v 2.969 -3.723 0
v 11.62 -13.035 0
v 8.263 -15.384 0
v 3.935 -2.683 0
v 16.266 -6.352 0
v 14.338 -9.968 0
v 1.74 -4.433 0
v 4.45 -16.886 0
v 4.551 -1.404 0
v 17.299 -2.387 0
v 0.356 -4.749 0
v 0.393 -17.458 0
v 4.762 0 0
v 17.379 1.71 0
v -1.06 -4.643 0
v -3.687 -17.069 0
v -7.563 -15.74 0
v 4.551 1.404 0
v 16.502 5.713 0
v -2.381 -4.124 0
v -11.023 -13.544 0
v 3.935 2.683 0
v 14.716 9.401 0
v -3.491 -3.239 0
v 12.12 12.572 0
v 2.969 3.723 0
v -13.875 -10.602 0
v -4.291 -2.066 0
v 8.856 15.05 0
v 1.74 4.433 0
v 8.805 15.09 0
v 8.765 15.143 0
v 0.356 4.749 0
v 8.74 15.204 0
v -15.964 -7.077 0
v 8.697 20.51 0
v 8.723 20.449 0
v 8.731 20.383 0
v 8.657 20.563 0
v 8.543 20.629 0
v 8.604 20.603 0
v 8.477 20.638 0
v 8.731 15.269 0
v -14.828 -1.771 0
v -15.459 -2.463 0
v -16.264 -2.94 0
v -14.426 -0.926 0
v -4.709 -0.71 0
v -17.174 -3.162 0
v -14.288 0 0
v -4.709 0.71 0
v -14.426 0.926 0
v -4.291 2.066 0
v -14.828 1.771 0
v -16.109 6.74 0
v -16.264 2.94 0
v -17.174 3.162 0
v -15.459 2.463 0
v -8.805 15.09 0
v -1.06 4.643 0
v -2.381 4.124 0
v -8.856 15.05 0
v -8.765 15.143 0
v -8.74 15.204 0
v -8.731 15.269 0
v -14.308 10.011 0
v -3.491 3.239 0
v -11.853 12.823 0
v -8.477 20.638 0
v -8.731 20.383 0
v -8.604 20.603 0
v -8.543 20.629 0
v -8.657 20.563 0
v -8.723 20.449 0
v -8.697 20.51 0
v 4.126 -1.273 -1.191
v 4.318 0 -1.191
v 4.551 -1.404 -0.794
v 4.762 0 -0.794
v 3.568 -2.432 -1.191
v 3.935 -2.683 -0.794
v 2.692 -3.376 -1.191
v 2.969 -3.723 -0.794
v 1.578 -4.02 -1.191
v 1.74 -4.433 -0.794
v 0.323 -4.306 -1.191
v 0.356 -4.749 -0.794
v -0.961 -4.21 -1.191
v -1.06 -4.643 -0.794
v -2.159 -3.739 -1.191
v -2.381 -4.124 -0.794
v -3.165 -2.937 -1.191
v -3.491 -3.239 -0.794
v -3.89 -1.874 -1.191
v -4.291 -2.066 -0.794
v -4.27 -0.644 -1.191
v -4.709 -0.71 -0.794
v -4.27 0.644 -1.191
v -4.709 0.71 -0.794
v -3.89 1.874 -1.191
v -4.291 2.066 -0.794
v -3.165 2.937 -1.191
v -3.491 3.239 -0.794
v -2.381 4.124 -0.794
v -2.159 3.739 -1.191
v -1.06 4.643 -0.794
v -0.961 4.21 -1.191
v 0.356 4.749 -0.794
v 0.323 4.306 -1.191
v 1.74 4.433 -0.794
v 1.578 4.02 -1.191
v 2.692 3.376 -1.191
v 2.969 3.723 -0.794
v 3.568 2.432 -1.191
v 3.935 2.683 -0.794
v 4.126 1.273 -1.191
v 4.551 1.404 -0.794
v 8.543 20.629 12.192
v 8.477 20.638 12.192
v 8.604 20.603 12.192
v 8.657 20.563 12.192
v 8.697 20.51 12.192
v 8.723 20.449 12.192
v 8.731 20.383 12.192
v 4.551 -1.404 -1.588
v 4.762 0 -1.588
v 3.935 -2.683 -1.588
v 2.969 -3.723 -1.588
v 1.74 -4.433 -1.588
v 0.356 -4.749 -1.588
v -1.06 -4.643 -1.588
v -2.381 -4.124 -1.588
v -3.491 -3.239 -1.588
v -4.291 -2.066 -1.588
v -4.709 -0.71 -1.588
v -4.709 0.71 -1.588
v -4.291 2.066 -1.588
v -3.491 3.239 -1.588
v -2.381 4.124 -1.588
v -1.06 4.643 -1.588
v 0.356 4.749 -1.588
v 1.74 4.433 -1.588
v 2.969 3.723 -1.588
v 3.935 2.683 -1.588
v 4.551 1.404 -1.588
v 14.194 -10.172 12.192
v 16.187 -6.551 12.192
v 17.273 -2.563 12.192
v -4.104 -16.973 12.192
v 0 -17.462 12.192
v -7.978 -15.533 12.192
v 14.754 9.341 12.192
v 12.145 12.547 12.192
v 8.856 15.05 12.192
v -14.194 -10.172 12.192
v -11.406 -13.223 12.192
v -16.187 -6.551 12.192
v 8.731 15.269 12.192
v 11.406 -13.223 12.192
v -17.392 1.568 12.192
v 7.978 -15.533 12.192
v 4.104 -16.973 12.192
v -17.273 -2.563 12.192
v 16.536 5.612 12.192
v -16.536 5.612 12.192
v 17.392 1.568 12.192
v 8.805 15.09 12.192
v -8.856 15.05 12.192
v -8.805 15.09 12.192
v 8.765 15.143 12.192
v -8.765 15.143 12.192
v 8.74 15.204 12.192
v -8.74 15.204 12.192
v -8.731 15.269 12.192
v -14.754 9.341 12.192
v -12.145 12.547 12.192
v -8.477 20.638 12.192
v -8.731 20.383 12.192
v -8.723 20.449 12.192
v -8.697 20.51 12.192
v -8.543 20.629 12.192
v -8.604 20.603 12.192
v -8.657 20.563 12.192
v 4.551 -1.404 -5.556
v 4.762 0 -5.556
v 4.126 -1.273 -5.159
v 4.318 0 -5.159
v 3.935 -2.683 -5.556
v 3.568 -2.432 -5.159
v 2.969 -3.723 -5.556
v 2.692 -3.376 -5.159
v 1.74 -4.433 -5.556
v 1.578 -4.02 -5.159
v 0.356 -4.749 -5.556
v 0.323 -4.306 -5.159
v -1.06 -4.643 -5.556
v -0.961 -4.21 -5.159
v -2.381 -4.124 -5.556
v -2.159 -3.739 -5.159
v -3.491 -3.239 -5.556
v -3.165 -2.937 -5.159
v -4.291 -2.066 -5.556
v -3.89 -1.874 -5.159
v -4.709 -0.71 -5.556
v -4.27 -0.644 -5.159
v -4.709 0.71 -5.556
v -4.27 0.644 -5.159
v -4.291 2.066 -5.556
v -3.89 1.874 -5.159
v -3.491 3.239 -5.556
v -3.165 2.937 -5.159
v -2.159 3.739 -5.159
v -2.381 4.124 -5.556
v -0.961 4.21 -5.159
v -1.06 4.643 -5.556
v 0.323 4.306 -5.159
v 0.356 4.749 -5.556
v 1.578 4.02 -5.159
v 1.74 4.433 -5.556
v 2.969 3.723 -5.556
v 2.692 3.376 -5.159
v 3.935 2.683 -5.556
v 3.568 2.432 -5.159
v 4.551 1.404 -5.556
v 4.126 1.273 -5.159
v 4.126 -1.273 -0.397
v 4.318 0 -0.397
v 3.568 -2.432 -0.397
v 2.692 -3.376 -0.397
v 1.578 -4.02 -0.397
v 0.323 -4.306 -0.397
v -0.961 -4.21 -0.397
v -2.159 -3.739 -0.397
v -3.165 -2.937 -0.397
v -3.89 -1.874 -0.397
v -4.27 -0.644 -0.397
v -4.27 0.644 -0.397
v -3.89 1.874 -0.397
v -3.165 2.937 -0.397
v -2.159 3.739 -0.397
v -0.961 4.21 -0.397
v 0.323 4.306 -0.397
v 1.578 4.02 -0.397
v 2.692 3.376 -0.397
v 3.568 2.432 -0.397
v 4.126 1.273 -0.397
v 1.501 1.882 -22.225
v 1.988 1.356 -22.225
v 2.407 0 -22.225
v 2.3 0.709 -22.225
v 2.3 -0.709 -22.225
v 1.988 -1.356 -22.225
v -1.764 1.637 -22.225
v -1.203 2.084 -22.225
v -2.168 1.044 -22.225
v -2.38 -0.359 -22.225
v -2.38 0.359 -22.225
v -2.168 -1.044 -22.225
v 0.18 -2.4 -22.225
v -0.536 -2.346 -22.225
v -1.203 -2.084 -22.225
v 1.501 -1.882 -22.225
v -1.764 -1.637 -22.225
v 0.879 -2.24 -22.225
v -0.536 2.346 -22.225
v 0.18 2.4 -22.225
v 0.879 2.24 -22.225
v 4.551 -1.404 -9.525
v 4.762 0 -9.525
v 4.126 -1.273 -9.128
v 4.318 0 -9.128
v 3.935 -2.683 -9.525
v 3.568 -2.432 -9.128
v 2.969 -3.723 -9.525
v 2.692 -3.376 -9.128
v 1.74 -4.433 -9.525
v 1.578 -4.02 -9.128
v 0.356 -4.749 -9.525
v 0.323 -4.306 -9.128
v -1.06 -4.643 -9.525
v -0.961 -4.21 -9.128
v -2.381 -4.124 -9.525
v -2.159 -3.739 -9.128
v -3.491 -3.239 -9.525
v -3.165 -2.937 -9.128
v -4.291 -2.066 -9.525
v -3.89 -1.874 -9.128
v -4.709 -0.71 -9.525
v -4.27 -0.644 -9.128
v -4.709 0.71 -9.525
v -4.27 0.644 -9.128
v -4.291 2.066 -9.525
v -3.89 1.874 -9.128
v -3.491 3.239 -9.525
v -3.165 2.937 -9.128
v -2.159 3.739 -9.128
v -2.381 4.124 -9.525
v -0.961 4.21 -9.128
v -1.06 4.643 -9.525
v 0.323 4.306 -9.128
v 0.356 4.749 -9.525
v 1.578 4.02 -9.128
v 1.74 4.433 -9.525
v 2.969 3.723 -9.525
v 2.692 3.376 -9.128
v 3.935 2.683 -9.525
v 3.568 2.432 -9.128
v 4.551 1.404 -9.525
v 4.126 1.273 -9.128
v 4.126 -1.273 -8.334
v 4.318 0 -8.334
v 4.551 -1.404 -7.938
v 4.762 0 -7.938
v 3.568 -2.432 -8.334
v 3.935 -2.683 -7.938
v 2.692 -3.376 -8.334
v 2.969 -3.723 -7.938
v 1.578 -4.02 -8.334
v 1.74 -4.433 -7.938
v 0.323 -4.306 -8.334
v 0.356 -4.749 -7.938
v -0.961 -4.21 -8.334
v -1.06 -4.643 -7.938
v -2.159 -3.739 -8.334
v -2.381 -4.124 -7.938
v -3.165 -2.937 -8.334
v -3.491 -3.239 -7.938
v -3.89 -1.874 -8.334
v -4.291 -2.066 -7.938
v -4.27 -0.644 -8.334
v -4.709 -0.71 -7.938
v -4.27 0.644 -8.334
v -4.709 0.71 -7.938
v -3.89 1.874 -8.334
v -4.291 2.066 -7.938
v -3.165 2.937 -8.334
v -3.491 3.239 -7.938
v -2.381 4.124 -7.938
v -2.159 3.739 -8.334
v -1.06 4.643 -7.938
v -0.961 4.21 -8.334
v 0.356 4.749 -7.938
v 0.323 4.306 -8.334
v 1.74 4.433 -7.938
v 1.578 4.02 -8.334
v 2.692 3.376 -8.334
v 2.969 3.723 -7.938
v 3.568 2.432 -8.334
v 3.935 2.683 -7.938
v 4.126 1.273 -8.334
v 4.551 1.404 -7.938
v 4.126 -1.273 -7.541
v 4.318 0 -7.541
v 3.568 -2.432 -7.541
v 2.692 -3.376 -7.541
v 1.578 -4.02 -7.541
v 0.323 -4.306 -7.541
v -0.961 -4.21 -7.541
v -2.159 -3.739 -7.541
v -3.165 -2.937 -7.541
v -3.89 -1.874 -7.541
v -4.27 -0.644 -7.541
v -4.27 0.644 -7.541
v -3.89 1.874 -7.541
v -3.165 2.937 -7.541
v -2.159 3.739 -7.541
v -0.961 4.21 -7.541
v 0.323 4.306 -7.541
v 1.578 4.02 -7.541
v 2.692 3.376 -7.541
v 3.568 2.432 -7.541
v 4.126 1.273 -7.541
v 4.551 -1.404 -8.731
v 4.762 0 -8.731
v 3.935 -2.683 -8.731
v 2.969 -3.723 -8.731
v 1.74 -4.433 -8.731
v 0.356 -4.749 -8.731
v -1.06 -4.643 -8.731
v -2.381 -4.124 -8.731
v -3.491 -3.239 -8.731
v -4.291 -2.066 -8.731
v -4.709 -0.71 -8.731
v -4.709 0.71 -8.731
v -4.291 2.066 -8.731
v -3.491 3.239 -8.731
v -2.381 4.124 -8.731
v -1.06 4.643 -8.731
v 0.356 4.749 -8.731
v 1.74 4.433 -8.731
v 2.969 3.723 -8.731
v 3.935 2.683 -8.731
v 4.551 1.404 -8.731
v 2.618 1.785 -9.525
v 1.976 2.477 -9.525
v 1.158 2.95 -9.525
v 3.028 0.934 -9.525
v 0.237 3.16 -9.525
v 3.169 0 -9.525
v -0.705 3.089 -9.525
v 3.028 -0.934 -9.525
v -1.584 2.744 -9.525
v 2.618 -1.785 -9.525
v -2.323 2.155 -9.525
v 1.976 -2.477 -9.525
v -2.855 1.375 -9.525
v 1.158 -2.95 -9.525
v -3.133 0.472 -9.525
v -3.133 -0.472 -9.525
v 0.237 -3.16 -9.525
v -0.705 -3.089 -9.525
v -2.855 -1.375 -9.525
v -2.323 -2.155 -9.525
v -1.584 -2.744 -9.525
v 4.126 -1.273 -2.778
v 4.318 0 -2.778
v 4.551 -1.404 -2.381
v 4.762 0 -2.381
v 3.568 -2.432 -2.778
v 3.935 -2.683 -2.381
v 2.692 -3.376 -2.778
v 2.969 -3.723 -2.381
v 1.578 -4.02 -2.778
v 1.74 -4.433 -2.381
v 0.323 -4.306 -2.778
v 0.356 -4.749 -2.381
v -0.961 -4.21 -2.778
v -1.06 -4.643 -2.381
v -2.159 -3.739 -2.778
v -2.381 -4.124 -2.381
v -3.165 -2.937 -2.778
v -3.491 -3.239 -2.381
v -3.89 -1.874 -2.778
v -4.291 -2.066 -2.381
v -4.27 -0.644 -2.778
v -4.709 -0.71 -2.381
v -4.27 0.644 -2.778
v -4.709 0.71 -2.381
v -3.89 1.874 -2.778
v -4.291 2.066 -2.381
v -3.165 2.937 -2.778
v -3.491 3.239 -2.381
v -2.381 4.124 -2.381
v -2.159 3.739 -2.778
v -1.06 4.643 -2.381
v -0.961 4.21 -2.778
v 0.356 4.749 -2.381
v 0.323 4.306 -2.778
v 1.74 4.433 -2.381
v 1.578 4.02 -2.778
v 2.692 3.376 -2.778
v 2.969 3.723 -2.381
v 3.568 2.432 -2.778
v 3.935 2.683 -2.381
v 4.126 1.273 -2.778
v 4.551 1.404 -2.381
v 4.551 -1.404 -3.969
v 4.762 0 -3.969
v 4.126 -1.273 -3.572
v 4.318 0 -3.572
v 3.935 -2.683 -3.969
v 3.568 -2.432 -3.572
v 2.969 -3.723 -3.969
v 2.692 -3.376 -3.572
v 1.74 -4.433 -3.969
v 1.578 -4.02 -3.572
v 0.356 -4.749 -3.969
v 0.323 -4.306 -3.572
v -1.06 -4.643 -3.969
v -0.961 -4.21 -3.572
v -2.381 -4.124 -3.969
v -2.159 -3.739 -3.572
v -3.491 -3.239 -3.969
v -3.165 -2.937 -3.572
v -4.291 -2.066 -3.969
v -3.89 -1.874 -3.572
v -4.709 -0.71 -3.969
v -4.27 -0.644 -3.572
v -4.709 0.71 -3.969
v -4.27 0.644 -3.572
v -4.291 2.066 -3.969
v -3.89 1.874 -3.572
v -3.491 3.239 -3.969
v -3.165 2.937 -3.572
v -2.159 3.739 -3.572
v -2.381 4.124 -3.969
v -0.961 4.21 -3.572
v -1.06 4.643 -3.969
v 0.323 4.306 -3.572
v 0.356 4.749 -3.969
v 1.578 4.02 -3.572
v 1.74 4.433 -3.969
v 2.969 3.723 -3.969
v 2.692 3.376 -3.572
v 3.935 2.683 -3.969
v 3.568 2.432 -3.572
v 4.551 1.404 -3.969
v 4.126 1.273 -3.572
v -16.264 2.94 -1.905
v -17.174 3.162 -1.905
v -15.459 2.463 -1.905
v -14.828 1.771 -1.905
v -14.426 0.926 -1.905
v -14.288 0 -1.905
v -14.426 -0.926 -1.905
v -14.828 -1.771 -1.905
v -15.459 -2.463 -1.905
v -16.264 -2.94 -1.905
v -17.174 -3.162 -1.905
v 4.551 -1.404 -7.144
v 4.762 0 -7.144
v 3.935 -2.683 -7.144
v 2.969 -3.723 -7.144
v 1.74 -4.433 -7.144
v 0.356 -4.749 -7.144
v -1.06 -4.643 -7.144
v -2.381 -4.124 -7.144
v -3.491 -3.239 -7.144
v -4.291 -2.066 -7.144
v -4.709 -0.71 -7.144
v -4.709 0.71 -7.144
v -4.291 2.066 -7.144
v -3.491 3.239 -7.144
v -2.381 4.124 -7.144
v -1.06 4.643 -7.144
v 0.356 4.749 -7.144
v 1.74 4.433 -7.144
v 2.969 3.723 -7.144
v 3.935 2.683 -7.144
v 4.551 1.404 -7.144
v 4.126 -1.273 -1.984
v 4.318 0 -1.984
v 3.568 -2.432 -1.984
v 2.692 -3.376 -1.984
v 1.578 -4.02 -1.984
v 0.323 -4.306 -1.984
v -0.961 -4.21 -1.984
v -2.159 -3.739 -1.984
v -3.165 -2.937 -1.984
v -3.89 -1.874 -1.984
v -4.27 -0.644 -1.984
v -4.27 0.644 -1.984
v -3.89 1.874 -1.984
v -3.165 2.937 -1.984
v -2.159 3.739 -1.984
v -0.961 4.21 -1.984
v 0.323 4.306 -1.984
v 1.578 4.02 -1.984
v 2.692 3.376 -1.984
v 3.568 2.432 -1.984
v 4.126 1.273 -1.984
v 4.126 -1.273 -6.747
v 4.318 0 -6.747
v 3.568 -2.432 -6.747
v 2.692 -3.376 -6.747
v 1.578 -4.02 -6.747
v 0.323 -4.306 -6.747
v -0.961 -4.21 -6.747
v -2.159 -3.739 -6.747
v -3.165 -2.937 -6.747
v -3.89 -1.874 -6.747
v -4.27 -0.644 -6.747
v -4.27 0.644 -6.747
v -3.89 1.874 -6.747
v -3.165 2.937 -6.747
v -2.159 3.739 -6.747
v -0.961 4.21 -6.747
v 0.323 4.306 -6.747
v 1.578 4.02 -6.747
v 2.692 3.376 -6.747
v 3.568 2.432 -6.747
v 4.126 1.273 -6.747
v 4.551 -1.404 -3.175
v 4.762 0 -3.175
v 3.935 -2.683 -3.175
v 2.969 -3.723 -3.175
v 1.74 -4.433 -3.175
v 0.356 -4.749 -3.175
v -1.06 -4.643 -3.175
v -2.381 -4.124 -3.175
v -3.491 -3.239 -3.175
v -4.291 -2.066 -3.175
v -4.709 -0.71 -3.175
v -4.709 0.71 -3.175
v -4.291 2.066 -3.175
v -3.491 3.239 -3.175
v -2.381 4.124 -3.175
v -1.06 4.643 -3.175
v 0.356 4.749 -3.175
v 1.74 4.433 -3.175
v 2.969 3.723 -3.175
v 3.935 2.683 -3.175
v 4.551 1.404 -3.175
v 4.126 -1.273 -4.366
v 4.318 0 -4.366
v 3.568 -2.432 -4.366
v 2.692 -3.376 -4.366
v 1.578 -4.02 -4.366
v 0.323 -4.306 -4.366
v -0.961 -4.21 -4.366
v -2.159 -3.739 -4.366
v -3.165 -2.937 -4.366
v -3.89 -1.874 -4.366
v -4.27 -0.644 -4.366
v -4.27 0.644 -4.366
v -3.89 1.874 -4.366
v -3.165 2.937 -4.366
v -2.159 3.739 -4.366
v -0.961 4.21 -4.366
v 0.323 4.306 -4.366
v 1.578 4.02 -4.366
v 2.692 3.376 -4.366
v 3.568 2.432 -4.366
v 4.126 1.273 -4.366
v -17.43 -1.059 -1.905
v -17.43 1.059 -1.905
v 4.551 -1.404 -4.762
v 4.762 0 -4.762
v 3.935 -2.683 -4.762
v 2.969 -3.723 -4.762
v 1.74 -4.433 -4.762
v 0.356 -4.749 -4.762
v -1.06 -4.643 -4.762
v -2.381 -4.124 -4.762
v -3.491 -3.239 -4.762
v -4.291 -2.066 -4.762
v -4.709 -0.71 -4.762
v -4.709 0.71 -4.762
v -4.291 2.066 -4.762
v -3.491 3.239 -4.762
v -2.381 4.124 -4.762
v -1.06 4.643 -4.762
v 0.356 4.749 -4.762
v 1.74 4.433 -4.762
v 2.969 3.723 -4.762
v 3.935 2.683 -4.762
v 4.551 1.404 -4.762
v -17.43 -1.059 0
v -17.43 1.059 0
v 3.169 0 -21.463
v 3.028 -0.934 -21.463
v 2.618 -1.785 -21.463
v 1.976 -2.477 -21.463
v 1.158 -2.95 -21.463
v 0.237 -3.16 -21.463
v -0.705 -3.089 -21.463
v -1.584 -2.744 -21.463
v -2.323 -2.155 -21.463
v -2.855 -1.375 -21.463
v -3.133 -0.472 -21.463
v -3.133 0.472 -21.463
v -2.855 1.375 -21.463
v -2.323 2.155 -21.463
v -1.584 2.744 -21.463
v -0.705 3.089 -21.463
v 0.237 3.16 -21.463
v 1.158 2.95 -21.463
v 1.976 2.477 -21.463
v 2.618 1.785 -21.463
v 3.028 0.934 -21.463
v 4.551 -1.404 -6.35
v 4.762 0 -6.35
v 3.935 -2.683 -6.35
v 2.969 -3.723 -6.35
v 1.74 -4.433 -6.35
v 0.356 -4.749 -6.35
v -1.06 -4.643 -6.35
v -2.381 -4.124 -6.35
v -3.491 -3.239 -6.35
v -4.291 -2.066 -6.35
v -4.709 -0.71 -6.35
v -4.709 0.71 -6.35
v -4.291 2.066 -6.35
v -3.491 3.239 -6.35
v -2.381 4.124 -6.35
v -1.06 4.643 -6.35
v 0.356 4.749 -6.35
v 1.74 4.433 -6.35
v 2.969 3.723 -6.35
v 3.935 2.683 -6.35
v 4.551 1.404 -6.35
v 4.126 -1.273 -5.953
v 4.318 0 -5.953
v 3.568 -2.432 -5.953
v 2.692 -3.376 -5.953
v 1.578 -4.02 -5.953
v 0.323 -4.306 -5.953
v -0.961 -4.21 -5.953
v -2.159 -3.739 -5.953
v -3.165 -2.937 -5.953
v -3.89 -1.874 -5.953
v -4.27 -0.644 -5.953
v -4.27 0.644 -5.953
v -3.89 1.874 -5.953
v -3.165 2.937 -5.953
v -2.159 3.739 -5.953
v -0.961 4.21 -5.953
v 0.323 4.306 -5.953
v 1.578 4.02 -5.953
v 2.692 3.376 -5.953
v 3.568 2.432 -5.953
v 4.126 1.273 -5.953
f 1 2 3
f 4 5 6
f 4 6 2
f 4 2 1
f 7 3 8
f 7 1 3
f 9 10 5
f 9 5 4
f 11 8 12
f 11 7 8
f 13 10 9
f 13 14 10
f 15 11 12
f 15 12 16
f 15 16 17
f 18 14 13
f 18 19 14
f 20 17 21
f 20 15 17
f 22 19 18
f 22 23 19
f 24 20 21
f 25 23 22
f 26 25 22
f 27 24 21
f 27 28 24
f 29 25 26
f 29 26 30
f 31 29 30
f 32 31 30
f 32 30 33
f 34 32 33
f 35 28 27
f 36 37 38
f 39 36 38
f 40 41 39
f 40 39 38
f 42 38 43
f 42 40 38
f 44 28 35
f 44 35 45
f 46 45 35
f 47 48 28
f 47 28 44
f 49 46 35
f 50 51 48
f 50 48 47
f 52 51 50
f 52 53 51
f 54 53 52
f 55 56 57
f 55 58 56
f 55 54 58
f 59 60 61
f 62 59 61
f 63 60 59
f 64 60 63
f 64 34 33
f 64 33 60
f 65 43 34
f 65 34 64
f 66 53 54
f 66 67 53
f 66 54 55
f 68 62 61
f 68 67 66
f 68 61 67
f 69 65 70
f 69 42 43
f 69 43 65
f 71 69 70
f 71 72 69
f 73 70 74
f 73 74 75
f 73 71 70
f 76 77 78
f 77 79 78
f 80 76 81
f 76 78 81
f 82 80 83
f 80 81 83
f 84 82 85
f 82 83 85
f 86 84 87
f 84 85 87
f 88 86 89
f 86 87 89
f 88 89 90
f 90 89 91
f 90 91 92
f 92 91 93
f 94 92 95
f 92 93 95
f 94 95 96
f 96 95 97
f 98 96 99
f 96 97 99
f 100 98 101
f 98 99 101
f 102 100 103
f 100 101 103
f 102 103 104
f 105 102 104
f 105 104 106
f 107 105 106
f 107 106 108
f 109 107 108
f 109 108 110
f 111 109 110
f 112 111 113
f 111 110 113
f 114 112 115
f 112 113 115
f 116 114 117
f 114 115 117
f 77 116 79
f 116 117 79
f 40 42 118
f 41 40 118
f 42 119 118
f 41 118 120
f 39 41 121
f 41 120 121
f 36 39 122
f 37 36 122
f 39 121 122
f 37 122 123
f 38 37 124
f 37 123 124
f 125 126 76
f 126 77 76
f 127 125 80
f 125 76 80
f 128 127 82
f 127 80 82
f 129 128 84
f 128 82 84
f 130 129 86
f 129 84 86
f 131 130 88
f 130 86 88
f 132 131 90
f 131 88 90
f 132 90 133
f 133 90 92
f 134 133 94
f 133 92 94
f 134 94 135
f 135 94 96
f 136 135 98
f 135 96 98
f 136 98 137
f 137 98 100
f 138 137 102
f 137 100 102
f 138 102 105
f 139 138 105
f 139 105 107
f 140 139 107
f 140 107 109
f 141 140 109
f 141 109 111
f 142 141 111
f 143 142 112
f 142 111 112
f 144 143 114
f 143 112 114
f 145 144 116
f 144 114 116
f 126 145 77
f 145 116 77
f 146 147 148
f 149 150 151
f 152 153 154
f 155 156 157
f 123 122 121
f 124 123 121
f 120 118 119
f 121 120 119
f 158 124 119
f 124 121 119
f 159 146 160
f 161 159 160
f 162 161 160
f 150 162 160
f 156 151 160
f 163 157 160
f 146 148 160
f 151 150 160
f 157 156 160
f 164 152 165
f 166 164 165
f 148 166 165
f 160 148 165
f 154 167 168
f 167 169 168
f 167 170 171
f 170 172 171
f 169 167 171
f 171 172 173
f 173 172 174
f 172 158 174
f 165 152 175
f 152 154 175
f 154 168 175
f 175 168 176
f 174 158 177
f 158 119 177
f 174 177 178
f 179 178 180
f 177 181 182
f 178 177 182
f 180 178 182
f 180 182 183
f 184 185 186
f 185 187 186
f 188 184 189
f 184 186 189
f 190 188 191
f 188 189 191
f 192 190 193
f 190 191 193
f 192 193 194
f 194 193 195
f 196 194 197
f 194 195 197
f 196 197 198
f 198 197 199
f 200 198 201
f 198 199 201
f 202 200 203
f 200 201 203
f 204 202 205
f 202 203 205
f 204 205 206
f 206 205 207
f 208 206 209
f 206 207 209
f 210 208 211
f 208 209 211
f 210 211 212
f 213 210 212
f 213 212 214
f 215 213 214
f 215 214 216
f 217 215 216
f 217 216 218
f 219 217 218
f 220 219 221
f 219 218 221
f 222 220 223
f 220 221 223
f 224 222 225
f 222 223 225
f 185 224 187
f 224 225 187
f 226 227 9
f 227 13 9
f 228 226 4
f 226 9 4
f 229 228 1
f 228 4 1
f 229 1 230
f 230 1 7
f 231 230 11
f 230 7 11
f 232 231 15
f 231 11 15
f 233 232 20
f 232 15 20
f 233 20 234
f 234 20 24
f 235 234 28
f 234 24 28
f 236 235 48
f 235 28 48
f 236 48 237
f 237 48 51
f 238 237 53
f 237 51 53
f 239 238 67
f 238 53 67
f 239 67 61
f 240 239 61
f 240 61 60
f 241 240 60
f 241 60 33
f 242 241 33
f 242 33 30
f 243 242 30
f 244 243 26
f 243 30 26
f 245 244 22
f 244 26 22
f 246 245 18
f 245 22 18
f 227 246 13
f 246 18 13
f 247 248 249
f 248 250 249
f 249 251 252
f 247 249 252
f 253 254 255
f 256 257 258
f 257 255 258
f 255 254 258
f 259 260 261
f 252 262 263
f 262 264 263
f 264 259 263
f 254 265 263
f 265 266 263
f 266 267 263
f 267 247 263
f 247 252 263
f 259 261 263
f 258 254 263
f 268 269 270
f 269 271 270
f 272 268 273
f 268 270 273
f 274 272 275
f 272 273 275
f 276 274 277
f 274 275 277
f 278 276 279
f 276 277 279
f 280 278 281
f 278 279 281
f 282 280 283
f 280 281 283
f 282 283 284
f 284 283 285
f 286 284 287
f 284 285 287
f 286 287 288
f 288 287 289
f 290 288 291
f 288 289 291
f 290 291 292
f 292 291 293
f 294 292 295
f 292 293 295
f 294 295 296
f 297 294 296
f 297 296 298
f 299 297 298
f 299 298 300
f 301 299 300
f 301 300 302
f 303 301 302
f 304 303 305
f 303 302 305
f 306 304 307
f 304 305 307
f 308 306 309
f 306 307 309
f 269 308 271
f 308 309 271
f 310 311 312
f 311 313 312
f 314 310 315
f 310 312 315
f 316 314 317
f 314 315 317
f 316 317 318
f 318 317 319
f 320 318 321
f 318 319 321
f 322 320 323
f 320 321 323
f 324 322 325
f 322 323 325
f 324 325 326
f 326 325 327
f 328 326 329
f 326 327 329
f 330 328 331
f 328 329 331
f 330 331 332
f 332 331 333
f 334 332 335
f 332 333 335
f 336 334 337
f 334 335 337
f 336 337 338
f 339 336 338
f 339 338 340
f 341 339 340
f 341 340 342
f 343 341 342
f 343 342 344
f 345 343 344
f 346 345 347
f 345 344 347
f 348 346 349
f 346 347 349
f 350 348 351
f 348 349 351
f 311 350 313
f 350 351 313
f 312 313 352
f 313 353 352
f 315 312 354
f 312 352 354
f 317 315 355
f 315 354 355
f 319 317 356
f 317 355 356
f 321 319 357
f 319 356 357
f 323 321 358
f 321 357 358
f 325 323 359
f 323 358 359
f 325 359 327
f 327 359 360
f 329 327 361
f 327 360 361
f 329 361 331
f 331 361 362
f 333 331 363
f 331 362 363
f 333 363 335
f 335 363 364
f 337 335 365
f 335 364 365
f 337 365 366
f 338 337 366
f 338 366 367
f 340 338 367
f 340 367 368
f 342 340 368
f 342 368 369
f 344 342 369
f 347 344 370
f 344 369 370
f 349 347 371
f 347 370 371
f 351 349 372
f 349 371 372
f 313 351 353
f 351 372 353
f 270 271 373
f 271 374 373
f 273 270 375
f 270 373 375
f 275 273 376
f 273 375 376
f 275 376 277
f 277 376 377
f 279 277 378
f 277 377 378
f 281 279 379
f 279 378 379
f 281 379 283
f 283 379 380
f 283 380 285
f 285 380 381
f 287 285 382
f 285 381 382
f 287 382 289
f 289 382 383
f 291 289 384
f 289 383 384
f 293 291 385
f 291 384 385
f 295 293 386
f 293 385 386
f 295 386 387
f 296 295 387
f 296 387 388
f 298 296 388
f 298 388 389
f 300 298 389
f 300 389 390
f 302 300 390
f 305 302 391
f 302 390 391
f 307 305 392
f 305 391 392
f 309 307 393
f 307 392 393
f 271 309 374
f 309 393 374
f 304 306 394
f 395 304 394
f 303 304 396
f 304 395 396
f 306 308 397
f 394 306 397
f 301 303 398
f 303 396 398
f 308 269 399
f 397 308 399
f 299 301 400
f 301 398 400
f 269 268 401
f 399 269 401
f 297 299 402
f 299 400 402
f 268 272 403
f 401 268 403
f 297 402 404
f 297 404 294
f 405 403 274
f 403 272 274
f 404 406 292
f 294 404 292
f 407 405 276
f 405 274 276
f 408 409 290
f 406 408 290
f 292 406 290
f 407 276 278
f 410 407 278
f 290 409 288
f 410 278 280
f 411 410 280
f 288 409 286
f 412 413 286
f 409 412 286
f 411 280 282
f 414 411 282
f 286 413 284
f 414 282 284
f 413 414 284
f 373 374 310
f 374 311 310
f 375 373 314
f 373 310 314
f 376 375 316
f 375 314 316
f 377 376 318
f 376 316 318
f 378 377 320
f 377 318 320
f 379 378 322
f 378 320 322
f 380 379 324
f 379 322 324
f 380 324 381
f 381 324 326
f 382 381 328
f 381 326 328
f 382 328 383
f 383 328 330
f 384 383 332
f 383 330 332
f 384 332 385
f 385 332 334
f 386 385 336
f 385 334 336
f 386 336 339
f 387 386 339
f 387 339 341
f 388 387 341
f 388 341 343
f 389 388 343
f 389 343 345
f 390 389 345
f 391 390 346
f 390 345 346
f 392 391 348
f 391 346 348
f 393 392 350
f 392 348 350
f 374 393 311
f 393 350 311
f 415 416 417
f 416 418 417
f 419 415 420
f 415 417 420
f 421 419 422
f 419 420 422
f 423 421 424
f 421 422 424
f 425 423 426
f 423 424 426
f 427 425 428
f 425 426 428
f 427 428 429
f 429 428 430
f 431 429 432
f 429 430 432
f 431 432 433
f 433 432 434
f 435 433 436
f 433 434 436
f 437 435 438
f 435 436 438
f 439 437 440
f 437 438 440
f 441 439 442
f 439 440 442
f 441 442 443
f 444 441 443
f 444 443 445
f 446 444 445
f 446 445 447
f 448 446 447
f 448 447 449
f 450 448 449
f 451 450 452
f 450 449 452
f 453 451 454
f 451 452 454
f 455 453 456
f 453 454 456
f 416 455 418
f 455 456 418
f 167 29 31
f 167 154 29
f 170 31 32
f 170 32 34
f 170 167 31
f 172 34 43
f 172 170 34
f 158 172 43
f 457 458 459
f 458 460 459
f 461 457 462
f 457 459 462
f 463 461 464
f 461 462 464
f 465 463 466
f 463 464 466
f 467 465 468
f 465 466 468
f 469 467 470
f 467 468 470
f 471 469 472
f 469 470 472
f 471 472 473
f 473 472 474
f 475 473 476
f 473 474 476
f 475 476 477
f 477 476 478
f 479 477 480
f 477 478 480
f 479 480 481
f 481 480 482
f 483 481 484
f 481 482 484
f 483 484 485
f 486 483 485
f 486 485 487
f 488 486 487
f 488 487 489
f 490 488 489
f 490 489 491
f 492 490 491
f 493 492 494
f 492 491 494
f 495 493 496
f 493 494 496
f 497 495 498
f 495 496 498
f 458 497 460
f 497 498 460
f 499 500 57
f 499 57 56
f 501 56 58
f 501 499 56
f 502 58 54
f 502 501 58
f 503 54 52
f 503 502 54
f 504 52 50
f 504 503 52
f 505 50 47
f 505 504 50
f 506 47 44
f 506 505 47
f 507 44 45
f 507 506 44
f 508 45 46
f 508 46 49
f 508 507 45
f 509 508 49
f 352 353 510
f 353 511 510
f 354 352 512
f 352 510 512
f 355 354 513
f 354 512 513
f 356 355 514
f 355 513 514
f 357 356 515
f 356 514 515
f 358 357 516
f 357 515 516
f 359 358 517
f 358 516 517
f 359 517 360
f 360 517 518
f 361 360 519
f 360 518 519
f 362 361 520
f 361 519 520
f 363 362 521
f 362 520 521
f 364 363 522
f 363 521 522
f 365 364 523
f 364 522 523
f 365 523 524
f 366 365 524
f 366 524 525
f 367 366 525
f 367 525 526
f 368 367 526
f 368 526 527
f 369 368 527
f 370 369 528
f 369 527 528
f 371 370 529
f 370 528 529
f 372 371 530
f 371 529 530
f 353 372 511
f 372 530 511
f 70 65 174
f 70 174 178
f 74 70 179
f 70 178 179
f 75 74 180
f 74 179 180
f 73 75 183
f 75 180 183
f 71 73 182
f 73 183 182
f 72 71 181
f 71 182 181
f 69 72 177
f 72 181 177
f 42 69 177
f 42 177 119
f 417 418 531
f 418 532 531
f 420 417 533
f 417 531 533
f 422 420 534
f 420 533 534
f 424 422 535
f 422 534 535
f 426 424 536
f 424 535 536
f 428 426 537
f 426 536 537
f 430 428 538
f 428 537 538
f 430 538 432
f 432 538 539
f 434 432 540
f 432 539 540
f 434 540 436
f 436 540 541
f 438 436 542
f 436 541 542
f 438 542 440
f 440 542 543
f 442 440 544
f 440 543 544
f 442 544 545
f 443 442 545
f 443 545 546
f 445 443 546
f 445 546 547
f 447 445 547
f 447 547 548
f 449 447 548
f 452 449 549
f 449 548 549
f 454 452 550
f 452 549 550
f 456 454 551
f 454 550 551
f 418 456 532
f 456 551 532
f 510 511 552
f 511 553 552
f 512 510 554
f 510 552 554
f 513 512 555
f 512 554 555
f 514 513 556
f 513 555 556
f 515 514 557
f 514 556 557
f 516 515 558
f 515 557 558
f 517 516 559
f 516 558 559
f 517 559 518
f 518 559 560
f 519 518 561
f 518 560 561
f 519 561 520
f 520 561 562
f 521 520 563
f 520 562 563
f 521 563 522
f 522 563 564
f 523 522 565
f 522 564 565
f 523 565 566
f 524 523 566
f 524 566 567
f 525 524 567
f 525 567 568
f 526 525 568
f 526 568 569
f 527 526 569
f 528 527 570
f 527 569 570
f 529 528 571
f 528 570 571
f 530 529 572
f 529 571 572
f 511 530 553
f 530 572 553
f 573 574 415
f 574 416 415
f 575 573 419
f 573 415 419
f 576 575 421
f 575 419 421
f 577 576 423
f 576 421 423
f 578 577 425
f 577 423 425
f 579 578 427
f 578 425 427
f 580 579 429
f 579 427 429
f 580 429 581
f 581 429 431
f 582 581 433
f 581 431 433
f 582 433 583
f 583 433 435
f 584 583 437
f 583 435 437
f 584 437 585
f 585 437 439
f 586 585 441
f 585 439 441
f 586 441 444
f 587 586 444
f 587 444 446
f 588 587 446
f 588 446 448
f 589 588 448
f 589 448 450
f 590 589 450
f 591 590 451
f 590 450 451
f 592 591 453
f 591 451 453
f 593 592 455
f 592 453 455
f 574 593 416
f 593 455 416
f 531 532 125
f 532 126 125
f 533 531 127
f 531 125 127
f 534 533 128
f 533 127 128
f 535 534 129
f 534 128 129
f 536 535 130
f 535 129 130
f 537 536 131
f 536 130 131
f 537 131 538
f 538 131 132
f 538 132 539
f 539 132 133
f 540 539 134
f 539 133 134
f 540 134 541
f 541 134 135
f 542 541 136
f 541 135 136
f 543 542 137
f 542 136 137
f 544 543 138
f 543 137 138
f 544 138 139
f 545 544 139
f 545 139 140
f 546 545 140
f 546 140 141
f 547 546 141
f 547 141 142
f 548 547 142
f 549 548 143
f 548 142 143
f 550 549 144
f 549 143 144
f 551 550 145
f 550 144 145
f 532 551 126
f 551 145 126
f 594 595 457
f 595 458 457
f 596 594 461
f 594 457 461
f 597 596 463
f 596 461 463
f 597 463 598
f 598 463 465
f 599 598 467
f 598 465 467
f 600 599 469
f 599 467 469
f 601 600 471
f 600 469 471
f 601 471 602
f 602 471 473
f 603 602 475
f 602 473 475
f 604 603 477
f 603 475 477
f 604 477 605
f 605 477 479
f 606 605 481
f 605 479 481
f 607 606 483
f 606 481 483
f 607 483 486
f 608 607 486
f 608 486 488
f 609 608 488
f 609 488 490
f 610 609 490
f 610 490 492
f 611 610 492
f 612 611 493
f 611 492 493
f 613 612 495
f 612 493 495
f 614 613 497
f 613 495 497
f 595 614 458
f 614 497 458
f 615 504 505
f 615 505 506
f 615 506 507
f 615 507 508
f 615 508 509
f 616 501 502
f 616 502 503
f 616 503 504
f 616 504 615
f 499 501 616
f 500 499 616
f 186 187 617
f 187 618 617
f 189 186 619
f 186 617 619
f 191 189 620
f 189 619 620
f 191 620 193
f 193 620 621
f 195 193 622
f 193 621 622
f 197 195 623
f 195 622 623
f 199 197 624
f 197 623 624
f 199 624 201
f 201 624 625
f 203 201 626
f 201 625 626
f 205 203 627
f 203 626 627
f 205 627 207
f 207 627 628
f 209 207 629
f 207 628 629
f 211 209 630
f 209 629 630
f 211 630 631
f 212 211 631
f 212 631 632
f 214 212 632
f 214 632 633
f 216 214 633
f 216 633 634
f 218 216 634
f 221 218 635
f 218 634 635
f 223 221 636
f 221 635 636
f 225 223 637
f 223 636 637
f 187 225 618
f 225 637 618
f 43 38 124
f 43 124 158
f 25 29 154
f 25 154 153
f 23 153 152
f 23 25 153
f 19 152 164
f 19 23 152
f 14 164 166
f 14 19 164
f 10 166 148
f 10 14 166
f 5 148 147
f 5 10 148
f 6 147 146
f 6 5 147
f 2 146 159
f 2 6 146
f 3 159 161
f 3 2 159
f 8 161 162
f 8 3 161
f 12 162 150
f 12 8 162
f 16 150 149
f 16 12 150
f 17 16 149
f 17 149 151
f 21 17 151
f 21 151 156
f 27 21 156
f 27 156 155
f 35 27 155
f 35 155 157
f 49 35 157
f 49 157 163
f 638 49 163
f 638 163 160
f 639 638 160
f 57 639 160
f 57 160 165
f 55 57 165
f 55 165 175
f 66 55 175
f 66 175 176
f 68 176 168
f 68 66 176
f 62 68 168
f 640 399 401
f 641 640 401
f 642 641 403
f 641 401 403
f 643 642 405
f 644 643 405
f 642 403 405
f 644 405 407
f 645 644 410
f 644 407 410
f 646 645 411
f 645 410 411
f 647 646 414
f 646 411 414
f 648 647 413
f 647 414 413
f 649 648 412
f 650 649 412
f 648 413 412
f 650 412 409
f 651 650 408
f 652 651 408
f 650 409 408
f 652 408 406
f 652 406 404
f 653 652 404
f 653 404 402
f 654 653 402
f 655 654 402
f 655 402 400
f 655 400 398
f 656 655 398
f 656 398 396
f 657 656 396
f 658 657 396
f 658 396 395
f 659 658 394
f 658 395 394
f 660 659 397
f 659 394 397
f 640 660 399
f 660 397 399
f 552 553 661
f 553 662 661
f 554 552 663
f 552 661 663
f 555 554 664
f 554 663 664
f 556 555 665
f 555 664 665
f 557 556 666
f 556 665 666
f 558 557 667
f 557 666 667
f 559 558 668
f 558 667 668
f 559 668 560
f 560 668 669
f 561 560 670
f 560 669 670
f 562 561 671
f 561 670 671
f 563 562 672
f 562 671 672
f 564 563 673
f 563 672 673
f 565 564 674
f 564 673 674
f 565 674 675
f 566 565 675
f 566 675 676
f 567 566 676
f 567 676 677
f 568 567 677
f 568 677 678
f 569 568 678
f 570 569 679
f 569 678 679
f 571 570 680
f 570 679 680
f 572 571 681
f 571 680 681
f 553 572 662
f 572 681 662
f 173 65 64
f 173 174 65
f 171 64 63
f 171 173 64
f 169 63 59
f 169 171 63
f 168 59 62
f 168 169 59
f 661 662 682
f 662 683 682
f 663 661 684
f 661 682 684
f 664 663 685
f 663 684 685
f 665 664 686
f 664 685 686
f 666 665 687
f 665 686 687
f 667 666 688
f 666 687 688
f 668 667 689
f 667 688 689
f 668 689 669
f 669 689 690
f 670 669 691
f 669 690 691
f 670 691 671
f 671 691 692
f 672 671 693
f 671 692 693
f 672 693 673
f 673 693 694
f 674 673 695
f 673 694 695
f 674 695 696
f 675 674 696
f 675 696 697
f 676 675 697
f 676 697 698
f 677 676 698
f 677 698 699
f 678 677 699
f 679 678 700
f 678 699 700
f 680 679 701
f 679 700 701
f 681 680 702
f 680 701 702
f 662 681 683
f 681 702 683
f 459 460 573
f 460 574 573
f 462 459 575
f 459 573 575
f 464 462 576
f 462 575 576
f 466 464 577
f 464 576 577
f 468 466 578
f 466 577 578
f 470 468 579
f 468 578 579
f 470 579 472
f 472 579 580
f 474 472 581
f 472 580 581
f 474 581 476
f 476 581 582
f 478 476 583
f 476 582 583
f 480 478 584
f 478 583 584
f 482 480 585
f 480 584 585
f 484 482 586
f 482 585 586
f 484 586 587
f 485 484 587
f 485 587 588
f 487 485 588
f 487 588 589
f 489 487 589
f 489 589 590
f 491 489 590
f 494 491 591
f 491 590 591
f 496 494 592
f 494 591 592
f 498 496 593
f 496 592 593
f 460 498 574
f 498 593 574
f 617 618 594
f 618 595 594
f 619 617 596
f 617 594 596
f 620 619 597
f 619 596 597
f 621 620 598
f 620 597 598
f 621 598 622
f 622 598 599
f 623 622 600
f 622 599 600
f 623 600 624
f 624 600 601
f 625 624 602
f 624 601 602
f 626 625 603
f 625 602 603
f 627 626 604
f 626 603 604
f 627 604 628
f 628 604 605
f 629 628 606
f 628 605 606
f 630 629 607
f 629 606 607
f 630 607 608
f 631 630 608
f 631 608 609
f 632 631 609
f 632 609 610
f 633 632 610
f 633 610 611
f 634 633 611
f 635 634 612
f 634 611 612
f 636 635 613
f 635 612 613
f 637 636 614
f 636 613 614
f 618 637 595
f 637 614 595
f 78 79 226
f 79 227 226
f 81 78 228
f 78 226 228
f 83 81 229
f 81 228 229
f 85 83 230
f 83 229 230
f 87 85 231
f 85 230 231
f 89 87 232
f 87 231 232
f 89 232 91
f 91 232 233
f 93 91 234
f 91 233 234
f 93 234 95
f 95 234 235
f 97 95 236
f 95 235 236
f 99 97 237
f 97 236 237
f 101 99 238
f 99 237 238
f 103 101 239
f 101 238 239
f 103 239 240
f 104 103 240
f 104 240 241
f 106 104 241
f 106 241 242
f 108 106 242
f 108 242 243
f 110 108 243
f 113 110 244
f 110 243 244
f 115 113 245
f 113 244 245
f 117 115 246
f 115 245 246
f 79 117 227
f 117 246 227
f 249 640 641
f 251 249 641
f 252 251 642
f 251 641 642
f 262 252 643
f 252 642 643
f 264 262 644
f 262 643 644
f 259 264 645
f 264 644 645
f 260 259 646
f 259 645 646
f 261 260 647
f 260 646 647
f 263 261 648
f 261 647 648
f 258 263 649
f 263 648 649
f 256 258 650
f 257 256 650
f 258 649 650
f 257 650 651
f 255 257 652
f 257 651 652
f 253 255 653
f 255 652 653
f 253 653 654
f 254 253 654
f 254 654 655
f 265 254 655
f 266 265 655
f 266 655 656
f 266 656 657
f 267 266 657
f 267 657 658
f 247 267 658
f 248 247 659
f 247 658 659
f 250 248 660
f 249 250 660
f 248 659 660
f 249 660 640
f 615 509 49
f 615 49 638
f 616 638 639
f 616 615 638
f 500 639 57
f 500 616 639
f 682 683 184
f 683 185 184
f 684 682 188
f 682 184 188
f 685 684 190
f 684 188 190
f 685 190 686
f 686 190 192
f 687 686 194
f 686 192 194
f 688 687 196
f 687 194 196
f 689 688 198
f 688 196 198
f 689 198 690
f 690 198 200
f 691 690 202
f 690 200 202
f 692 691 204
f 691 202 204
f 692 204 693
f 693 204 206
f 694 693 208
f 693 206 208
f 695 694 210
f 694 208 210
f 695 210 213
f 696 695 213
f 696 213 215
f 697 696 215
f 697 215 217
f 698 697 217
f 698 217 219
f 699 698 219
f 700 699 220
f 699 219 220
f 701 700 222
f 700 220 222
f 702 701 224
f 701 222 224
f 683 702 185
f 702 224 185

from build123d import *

# Parameters (mm, degrees)
EXTRUDE1_DEPTH      = 12.192
EXTRUDE3_DEPTH      = 1.27
CHAMFER1_SIZE       = 0.762
FILLET1_R           = 0.254
BOSS_EXTRUDE1_START = 1.905
BOSS_EXTRUDE1_DEPTH = 1.905


with BuildPart() as part:
    # Sketch1 → Extrude1 (new body)
    with BuildSketch(Plane.XY):
        with BuildLine():
            Line((-8.73125, 15.122968614), (-8.73125, 20.6375))
            Line((-8.73125, 20.6375), (8.73125, 20.6375))
            Line((8.73125, 20.6375), (8.73125, 15.122968614))
            ThreePointArc((8.73125, 15.122968614), (0, -17.4625), (-8.73125, 15.122968614))
        make_face()
    extrude(amount=EXTRUDE1_DEPTH)



with BuildPart() as body_2:
    # Sketch3 → Extrude3 (new body)
    with BuildSketch(Plane(origin=(0, 0, 0), x_dir=(-1, 0, 0), z_dir=(0, 0, -1))):
        Polygon((3.175, 1.833087105), (0, 3.666174209), (-3.175, 1.833087105), (-3.175, -1.833087105), (0, -3.666174209), (3.175, -1.833087105), align=None)
    extrude(amount=EXTRUDE3_DEPTH)


with BuildPart() as part_1:
    add(part.part)

    add(body_2.part)  # Revolve1 merges body 2
    # Sketch5 → Revolve1 (revolve)
    with BuildSketch(Plane(origin=(0, 0, 0), x_dir=(1, 0, 0), z_dir=(0, 1, 0))):
        Polygon((0, 0), (0, 22.225), (3.16865, 22.225), (3.16865, 9.525), (4.7625, 9.525), (4.318, 9.128125), (4.7625, 8.73125), (4.318, 8.334375), (4.7625, 7.9375), (4.318, 7.540625), (4.7625, 7.14375), (4.318, 6.746875), (4.7625, 6.35), (4.318, 5.953125), (4.7625, 5.55625), (4.318, 5.159375), (4.7625, 4.7625), (4.318, 4.365625), (4.7625, 3.96875), (4.318, 3.571875), (4.7625, 3.175), (4.318, 2.778125), (4.7625, 2.38125), (4.318, 1.984375), (4.7625, 1.5875), (4.318, 1.190625), (4.7625, 0.79375), (4.318, 0.396875), (4.7625, 0), align=None)
    revolve(axis=Axis((0, 0, 0), (0, 0, -1)))

    # Chamfer1
    chamfer1_edges = [part_1.edges().sort_by_distance(p)[0] for p in [
        (-3.16865, 0, -22.225),
    ]]
    chamfer(chamfer1_edges, length=CHAMFER1_SIZE)

    # Fillet1
    fillet1_edges = [part_1.edges().sort_by_distance(p)[0] for p in [
        (-8.73125, 15.122968614, 6.096),
        (-8.73125, 20.6375, 6.096),
        (8.73125, 20.6375, 6.096),
        (8.73125, 15.122968614, 6.096),
    ]]
    fillet(fillet1_edges, radius=FILLET1_R)

    # Sketch6 → Boss-Extrude1 (add)
    with BuildSketch(Plane(origin=(0, 0, 0), x_dir=(-1, 0, 0), z_dir=(0, 0, -1)).offset(BOSS_EXTRUDE1_START)):
        with BuildLine():
            ThreePointArc((17.173863636, 3.161852946), (14.2875, 0), (17.173863636, -3.161852946))
            ThreePointArc((17.173863636, -3.161852946), (17.4625, 0), (17.173863636, 3.161852946))
        make_face()
    extrude(amount=-BOSS_EXTRUDE1_DEPTH)


solid = part_1.part
